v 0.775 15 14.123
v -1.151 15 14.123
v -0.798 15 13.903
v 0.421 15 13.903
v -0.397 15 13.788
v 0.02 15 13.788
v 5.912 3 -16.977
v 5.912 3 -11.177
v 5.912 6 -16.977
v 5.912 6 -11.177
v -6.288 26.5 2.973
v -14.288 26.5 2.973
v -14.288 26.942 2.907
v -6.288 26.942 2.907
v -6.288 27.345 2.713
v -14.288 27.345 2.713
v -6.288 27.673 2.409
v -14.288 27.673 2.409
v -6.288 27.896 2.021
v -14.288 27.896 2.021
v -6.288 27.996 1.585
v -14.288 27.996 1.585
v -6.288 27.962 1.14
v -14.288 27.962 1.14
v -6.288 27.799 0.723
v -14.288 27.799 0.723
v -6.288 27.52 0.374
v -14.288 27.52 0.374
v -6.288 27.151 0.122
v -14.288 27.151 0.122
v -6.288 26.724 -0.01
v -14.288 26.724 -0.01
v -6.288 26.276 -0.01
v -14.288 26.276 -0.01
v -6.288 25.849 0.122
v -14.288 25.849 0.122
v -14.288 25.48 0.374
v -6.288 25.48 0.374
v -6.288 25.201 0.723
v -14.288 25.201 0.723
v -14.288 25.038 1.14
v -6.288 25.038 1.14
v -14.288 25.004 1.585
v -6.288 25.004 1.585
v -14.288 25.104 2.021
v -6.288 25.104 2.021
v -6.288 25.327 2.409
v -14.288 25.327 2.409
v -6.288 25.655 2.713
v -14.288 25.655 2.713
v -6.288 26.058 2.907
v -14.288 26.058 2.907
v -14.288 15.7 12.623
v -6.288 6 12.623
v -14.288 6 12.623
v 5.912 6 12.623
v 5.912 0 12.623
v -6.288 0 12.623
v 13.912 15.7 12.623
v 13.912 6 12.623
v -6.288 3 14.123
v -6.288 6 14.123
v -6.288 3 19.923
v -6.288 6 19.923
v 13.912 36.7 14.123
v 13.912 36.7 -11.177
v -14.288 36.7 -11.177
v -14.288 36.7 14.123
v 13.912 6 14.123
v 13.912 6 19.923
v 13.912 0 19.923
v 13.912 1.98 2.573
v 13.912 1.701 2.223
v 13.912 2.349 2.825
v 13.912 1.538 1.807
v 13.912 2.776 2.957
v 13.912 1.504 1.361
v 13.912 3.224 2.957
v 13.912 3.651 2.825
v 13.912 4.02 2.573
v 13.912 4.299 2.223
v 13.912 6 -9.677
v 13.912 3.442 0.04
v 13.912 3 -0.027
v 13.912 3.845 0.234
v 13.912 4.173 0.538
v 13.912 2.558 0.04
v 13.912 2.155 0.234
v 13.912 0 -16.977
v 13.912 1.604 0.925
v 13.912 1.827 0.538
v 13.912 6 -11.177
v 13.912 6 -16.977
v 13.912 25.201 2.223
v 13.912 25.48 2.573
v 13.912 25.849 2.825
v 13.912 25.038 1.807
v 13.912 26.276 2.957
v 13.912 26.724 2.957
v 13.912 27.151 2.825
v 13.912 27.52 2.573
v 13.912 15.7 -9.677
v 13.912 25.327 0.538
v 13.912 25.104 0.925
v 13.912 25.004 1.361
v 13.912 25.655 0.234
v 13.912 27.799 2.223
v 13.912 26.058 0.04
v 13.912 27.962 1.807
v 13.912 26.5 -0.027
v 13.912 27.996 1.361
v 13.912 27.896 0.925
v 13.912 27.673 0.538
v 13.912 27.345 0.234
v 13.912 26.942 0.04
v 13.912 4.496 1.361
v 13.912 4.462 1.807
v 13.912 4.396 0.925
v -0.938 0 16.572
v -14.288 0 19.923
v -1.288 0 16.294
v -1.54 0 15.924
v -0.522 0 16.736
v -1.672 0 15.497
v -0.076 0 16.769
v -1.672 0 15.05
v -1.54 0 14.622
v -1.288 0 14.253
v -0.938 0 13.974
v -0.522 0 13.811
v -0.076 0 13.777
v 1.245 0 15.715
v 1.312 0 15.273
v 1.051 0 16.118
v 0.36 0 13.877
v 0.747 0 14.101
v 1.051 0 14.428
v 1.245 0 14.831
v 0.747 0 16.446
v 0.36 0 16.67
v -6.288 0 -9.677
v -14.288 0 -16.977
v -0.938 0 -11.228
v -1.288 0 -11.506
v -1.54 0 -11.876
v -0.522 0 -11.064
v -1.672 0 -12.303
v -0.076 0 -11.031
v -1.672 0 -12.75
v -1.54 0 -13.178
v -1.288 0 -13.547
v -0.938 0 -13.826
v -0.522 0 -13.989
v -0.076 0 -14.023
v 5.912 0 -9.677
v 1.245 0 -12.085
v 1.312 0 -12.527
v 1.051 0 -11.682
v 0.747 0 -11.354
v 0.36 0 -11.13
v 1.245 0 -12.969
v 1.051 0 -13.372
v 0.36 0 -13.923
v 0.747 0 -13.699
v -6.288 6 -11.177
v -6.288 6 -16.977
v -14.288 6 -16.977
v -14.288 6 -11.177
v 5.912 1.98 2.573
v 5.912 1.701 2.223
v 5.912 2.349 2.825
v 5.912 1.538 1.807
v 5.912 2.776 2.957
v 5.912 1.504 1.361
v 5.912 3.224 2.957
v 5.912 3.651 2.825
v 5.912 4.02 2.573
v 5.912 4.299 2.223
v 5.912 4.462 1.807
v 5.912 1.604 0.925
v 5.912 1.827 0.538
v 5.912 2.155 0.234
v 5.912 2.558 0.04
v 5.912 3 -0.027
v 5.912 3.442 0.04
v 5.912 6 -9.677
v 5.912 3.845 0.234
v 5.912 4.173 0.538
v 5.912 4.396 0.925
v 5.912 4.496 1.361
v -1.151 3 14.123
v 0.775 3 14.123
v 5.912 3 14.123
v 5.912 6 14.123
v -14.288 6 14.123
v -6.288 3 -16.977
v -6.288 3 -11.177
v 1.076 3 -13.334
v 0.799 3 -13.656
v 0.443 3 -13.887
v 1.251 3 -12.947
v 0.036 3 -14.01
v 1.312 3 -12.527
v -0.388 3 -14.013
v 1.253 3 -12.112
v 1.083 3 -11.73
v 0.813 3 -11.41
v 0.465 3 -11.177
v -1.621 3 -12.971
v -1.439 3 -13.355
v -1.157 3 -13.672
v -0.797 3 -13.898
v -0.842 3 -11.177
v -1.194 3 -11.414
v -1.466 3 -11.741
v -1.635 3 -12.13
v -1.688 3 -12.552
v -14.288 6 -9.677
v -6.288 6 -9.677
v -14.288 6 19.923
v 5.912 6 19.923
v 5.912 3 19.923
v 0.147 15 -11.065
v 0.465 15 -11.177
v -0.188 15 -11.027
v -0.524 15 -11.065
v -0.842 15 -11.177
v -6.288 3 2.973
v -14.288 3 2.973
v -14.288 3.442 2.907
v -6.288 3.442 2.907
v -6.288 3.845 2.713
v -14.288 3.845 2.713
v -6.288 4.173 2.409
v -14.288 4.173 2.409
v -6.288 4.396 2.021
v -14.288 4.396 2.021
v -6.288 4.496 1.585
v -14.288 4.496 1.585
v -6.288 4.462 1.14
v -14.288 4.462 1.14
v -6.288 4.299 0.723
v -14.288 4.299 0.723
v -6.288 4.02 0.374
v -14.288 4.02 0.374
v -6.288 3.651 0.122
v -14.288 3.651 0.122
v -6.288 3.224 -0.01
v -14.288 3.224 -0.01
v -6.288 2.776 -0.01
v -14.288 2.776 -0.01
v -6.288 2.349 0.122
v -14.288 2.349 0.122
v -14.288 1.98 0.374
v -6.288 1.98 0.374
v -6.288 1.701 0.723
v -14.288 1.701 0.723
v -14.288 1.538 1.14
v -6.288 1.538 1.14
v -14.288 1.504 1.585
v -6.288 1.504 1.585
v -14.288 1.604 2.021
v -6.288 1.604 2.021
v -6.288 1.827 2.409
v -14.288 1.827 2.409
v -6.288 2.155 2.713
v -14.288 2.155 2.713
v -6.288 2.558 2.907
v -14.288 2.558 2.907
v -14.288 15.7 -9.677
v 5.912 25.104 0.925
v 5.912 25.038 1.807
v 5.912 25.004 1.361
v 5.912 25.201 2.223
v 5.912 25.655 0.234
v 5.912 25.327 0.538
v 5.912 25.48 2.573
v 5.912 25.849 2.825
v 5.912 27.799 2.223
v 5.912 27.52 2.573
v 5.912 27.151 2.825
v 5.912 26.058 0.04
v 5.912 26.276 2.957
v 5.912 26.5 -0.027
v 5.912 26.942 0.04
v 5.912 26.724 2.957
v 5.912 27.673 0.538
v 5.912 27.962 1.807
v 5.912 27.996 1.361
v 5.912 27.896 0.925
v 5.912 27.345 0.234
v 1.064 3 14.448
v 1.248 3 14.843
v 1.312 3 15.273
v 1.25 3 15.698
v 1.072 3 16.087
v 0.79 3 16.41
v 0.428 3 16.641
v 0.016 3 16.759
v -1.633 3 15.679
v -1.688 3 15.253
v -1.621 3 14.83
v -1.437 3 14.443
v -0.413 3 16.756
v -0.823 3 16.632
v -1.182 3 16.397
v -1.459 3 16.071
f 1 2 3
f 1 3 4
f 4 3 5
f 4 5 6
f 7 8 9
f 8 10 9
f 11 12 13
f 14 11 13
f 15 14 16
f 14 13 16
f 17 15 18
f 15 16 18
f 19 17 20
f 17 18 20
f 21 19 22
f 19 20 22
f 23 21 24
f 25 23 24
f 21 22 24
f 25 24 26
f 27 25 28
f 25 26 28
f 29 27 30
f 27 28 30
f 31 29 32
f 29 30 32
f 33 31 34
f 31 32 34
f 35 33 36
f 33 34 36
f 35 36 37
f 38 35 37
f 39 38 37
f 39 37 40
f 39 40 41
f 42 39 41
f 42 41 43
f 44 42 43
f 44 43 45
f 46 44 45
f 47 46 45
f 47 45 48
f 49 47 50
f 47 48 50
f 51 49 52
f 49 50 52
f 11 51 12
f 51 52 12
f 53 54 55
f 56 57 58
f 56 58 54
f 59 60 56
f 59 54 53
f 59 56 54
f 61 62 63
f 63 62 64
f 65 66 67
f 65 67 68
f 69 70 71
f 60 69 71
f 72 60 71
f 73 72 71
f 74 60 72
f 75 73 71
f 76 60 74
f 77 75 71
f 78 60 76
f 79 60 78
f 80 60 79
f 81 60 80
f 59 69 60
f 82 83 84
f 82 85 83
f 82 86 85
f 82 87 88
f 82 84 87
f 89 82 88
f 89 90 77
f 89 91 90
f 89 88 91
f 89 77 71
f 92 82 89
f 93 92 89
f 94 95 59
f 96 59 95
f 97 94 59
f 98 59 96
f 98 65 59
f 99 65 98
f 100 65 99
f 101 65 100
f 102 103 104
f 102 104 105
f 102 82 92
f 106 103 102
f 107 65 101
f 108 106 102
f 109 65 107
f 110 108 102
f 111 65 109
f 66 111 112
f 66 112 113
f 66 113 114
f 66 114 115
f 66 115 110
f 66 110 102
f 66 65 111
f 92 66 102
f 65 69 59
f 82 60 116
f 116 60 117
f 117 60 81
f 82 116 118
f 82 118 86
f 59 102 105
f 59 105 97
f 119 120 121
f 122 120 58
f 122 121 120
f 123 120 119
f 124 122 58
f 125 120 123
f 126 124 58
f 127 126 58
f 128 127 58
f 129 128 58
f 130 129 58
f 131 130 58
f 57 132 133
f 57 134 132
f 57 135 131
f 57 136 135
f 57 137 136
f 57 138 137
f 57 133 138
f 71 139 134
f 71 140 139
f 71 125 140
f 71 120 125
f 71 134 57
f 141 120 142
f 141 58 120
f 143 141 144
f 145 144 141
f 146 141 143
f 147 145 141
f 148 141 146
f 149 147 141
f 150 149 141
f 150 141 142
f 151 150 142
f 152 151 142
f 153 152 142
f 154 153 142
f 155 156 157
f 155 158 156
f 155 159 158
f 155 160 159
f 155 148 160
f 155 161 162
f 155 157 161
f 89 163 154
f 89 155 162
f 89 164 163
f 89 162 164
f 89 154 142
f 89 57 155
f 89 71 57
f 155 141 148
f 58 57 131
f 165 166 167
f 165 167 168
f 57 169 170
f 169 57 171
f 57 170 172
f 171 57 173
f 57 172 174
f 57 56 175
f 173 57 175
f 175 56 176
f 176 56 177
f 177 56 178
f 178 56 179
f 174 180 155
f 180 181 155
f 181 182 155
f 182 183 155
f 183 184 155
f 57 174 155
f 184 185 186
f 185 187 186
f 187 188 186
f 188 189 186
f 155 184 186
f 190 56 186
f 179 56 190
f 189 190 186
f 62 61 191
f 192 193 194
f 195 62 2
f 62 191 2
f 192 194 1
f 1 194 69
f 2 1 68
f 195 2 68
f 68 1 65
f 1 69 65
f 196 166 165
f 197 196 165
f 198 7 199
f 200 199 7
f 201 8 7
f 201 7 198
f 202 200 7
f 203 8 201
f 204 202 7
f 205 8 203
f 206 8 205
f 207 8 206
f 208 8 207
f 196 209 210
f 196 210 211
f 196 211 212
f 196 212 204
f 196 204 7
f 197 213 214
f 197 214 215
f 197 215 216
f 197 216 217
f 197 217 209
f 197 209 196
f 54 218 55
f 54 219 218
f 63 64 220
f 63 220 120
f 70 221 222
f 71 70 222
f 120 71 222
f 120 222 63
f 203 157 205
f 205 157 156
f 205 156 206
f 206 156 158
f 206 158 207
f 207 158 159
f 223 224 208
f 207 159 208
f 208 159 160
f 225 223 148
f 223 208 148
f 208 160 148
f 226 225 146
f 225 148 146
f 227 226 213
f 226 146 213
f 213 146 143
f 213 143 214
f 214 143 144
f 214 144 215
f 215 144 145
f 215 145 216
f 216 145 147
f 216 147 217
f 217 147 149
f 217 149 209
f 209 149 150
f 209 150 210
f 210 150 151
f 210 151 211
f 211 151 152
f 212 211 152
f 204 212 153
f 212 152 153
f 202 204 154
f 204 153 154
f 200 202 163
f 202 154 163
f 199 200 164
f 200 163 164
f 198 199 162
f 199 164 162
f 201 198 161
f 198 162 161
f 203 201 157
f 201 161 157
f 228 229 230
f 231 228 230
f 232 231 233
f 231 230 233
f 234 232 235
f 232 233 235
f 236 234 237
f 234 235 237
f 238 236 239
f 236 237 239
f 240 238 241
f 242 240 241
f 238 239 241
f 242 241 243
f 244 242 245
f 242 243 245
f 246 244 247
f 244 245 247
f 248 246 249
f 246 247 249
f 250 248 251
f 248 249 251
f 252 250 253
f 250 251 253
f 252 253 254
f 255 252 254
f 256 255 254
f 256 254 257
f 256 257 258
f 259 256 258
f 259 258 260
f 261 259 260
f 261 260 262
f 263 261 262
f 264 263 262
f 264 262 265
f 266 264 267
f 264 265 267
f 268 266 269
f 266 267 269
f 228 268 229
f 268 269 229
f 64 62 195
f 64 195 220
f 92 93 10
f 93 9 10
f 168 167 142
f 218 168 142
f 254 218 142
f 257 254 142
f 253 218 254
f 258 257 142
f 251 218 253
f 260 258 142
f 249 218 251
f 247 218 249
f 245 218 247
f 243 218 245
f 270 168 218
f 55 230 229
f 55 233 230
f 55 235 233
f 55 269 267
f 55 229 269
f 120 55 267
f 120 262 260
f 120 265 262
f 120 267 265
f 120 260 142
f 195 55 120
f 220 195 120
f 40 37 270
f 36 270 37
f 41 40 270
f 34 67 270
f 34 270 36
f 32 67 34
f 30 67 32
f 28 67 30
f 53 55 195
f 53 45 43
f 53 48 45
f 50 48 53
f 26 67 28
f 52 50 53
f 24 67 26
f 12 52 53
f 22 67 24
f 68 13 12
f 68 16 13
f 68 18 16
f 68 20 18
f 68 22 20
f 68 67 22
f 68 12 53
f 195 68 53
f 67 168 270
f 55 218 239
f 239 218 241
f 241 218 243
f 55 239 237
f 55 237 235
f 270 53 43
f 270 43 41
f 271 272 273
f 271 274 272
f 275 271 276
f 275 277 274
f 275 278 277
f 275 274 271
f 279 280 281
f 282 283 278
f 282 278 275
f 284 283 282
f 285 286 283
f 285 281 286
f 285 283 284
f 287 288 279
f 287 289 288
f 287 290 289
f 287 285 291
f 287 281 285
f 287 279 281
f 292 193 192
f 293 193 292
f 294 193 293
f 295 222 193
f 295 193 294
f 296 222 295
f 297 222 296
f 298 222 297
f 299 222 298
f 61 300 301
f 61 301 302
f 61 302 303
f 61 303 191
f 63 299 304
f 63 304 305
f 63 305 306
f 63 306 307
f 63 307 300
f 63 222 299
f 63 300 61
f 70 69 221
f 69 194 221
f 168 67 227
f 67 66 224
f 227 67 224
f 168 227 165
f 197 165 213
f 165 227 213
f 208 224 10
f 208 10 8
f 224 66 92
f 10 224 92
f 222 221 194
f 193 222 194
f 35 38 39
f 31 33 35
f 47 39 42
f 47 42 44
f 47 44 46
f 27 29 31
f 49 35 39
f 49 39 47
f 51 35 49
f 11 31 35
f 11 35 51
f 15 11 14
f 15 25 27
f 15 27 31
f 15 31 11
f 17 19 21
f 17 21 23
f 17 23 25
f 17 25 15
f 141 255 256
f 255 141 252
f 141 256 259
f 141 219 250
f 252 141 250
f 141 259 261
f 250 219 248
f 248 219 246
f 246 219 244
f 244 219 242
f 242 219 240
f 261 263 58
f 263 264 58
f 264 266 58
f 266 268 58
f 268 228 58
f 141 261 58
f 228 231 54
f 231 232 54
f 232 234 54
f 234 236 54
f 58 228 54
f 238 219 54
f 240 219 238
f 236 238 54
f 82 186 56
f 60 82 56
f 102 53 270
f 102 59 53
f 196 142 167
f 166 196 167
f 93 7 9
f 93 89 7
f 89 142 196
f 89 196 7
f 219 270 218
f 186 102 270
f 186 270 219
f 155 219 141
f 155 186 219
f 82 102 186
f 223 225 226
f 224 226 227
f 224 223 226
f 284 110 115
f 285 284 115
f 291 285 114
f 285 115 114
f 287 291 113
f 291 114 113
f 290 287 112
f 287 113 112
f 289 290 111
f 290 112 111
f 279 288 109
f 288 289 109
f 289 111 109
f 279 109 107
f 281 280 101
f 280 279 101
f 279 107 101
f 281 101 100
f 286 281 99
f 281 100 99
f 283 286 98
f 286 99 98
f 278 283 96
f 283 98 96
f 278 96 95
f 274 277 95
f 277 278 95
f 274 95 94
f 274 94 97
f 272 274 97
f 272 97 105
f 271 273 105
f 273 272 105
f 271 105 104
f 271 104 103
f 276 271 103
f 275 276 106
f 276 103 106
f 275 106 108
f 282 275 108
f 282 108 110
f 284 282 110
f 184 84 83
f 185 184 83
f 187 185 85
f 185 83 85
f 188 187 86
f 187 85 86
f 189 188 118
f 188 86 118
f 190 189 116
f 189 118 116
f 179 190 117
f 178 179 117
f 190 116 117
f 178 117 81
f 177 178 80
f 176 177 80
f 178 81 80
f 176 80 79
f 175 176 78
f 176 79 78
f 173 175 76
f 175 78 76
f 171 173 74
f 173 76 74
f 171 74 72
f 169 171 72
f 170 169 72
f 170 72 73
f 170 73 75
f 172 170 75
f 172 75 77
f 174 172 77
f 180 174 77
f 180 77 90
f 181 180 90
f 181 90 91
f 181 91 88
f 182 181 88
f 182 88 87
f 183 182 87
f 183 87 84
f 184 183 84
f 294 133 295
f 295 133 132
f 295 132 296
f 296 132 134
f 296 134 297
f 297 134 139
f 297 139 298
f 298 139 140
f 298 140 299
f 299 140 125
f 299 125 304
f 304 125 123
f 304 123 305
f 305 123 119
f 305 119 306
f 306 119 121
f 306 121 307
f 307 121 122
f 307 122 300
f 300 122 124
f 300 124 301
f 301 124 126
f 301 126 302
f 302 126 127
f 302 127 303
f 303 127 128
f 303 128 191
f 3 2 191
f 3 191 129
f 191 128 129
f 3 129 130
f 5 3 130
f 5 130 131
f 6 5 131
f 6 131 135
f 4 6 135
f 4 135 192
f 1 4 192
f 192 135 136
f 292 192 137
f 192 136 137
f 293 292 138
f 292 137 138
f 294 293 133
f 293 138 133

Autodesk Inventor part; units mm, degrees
ref_plane "YZ Plane" through (0, 0, 0) normal (1, 0, 0) x (0, 1, 0)
ref_plane "XZ Plane" through (0, 0, 0) normal (0, 1, 0) x (-1, 0, 0)
ref_plane "XY Plane" through (0, 0, 0) normal (0, 0, 1) x (1, 0, 0)
sketch "Sketch1" plane through (0, 0, 0) normal (0, 1, 0) x (-1, 0, 0)
  line L0 (6.2884, 19.9233) -> (-5.9116, 19.9233)
  line L1 (-5.9116, 19.9233) -> (-5.9116, 12.6233)
  line L2 (-5.9116, 12.6233) -> (6.2884, 12.6233)
  line L3 (6.2884, 12.6233) -> (6.2884, 19.9233)
  point P0 (0, 0)
  dimension "d0" = 7.3
  dimension "d1" = 12.2
extrude "Extrusion1" add sketch "Sketch1" along normal blind 3
sketch "Sketch2" plane through (0, 3, 0) normal (0, 1, 0) x (1, 0, 0)
  line L0 (5.9116, -19.9233) -> (5.9116, -12.6233) projected
  line L1 (5.9116, -12.6233) -> (-6.2884, -12.6233) projected
  line L2 (-6.2884, -12.6233) -> (-6.2884, -19.9233) projected
  line L3 (-6.2884, -19.9233) -> (5.9116, -19.9233) projected
  line L4 (5.9116, -12.6233) -> (-6.2884, -12.6233)
  line L5 (-6.2884, -12.6233) -> (-6.2884, -14.1233)
  line L6 (-6.2884, -14.1233) -> (5.9116, -14.1233)
  line L7 (5.9116, -14.1233) -> (5.9116, -12.6233)
  point P0 (0, 0)
  point P1 (5.9116, -14.1233)
  dimension "d4" = 1.5
extrude "Extrusion2" add sketch "Sketch2" along normal blind 15.7 contours L6 L2 L1 L0
sketch "Sketch3" plane through (5.9116, 0, 12.6233) normal (0, 0, -1) x (-1, 0, 0)
  line L0 (0, 0) -> (12.2, 0) projected
  line L1 (12.2, 0) -> (12.2, 18.7) projected
  line L2 (0, 18.7) -> (12.2, 18.7) projected
  line L3 (0, 0) -> (0, 18.7) projected
  line L4 (0, 18.7) -> (12.2, 18.7)
  line L5 (12.2, 18.7) -> (12.2, 15.7)
  line L6 (12.2, 15.7) -> (0, 15.7)
  line L7 (0, 15.7) -> (0, 18.7)
  point P0 (5.9116, 0)
  point P1 (0, 15.7)
  dimension "d7" = 3
extrude "Extrusion3" add sketch "Sketch3" along normal blind 23.8 contours L3 L2 L1 L6
sketch "Sketch4" plane through (-6.2884, 15.7, 12.6233) normal (0, -1, 0) x (1, 0, 0)
  line L0 (0, 0) -> (12.2, 0) projected
  line L1 (0, 0) -> (0, -23.8) projected
  line L2 (12.2, -23.8) -> (0, -23.8) projected
  line L3 (12.2, 0) -> (12.2, -23.8) projected
  line L4 (12.2, -23.8) -> (0, -23.8)
  line L5 (0, -23.8) -> (0, -22.3)
  line L6 (0, -22.3) -> (12.2, -22.3)
  line L7 (12.2, -22.3) -> (12.2, -23.8)
  point P0 (6.2884, -12.6233)
  dimension "d10" = 1.5
extrude "Extrusion4" add sketch "Sketch4" along normal up to surface (15.7 mm away) contours L6 L3 L2 L1
sketch "Sketch5" plane through (5.9116, 0, -11.1767) normal (0, 0, -1) x (-1, 0, 0)
  line L0 (12.2, 18.7) -> (12.2, 0) projected
  line L1 (12.2, 18.7) -> (0, 18.7) projected
  line L2 (0, 18.7) -> (0, 0) projected
  line L3 (12.2, 0) -> (0, 0) projected
  line L4 (12.2, 0) -> (0, 0)
  line L5 (0, 0) -> (0, 3)
  line L6 (0, 3) -> (12.2, 3)
  line L7 (12.2, 3) -> (12.2, 0)
  point P0 (5.9116, 0)
  dimension "d13" = 3
extrude "Extrusion5" add sketch "Sketch5" along normal blind 5.8 contours L0 L3 L2 L6
sketch "Sketch6" plane through (0, 0, 0) normal (0, -1, 0) x (1, 0, 0)
  arc A0 (-0.7384, -2.4741) -> (0.3616, -2.4741) centre (-0.1884, -3.4267) ccw construction
  circle A1 centre (-0.1884, -3.4267) radius 1.1 construction
  arc A2 (0.3616, -32.1794) -> (-0.7384, -32.1794) centre (-0.1884, -31.2267) ccw projected
  circle A3 centre (-0.1884, -31.2267) radius 1.5
  circle A4 centre (-0.1884, -3.4267) radius 1.5
  point P0 (0, 0)
  dimension "d16" = 3
  dimension "d17" = 3
extrude "Extrusion6" cut sketch "Sketch6" against normal up to surface (3 mm away)
sketch "Sketch8" plane through (5.9116, 0, 19.9233) normal (1, 0, 0) x (0, 0, -1)
  line L0 (0, 0) -> (7.3, 0) projected
  line L1 (7.3, 0) -> (7.3, 15.7) projected
  line L2 (7.3, 15.7) -> (29.6, 15.7) projected
  line L3 (29.6, 15.7) -> (29.6, 0) projected
  line L4 (36.9, 0) -> (29.6, 0) projected
  line L5 (36.9, 3) -> (36.9, 0) projected
  line L6 (31.1, 3) -> (36.9, 3) projected
  line L7 (31.1, 18.7) -> (31.1, 3) projected
  line L8 (5.8, 18.7) -> (31.1, 18.7) projected
  line L9 (5.8, 3) -> (5.8, 18.7) projected
  line L10 (0, 3) -> (5.8, 3) projected
  line L11 (0, 0) -> (0, 3) projected
  line L12 (0, 0) -> (36.9, 0)
  line L13 (36.9, 0) -> (36.9, 6)
  line L14 (36.9, 6) -> (0, 6)
  line L15 (0, 6) -> (0, 0)
  point P0 (19.9233, 0)
  dimension "d22" = 6
extrude "Extrusion8" add sketch "Sketch8" along normal blind 8 contours L11 L10 L9 L14 L1 L0 | L1 L14 L3 L12 | L15 L14 L9 L10 | L3 L14 L7 L6 L5 L4 | L14 L13 L6 L7
sketch "Sketch9" plane through (-6.2884, 0, 12.6233) normal (-1, 0, 0) x (0, 0, 1)
  line L0 (-29.6, 6) -> (7.3, 6)
  line L1 (7.3, 6) -> (7.3, 0)
  line L2 (7.3, 0) -> (-29.6, 0)
  line L3 (-29.6, 0) -> (-29.6, 6)
  point P0 (-12.6233, 0)
  point P1 (7.3, 6)
  point P2 (-29.6, 0)
extrude "Extrusion9" add sketch "Sketch9" along normal blind 8
sketch "Sketch10" plane through (13.9116, 0, 19.9233) normal (1, 0, 0) x (0, 0, -1)
  line L0 (0, 6) -> (0, 0) projected
  line L1 (0, 0) -> (36.9, 0) projected
  line L2 (36.9, 0) -> (36.9, 6) projected
  line L3 (36.9, 6) -> (0, 6) projected
  line L4 (0, 6) -> (36.9, 0) construction
  line L5 (36.9, 6) -> (0, 0) construction
  circle A0 centre (18.45, 3) radius 1.5
  point P0 (19.9233, 0)
  dimension "d27" = 3
extrude "Extrusion10" cut sketch "Sketch10" against normal blind 8 contours A0
sketch "Sketch11" plane through (0, 18.7, 0) normal (0, 1, 0) x (1, 0, 0)
  line L0 (5.9116, -14.1233) -> (5.9116, 11.1767) projected
  line L1 (-6.2884, 11.1767) -> (5.9116, 11.1767) projected
  line L2 (-6.2884, -14.1233) -> (-6.2884, 11.1767) projected
  line L3 (-6.2884, -14.1233) -> (5.9116, -14.1233) projected
  line L4 (5.9116, -14.1233) -> (0, -14.1233)
  line L5 (0, -14.1233) -> (0, 11.1767)
  line L6 (0, 11.1767) -> (5.9116, 11.1767)
  line L7 (5.9116, 11.1767) -> (5.9116, -14.1233)
  point P0 (0, 0)
extrude "Extrusion11" add sketch "Sketch11" along normal blind 10 contours L3 L5 L1 L0
sketch "Sketch12" plane through (5.9116, 15.7, 12.6233) normal (1, 0, 0) x (0, 0, -1)
  line L0 (22.3, -9.7) -> (23.8, -9.7) projected
  line L1 (23.8, -9.7) -> (23.8, 13) projected
  line L2 (-1.5, 13) -> (23.8, 13) projected
  line L3 (-1.5, -9.7) -> (-1.5, 13) projected
  line L4 (-1.5, -9.7) -> (0, -9.7) projected
  line L5 (0, -9.7) -> (0, 0) projected
  line L6 (0, 0) -> (22.3, 0) projected
  line L7 (22.3, 0) -> (22.3, -9.7) projected
  line L8 (-1.5, 13) -> (23.8, 13)
  line L9 (23.8, 13) -> (23.8, 5)
  line L10 (23.8, 5) -> (-1.5, 5)
  line L11 (-1.5, 5) -> (-1.5, 13)
  point P0 (12.6233, -15.7)
  point P1 (-1.5, 5)
  dimension "d32" = 8
extrude "Extrusion12" add sketch "Sketch12" along normal up to surface (8 mm away) contours L10 L3 L2 L1
sketch "Sketch14" plane through (0, 28.7, 0) normal (0, 1, 0) x (1, 0, 0)
  line L0 (5.9116, 11.1767) -> (5.9116, -14.1233) projected
  line L1 (0, -14.1233) -> (13.9116, -14.1233) projected
  line L2 (13.9116, -14.1233) -> (13.9116, 11.1767) projected
  line L3 (0, 11.1767) -> (13.9116, 11.1767) projected
  line L4 (0, 11.1767) -> (0, -14.1233) projected
  line L5 (0, 11.1767) -> (13.9116, 11.1767)
  line L6 (13.9116, 11.1767) -> (13.9116, -14.1233)
  line L7 (13.9116, -14.1233) -> (0, -14.1233)
  line L8 (0, -14.1233) -> (0, 11.1767)
  point P0 (0, 0)
extrude "Extrusion14" add sketch "Sketch14" along normal blind 8
sketch "Sketch16" plane through (5.9116, 15.7, 12.6233) normal (1, 0, 0) x (0, 0, -1)
  line L0 (23.8, 5) -> (-1.5, 5) projected
  line L1 (-1.5, -9.7) -> (-1.5, 5) projected
  line L2 (-1.5, -9.7) -> (0, -9.7) projected
  line L3 (0, -9.7) -> (0, 0) projected
  line L4 (0, 0) -> (22.3, 0) projected
  line L5 (22.3, 0) -> (22.3, -9.7) projected
  line L6 (22.3, -9.7) -> (23.8, -9.7) projected
  line L7 (23.8, -9.7) -> (23.8, 5) projected
  point P0 (12.6233, -15.7)
extrude "Extrusion16" add sketch "Sketch16" along normal blind 8
sketch "Sketch17" plane through (13.9116, 0, 19.9233) normal (1, 0, 0) x (0, 0, -1)
  circle A0 centre (18.45, 3) radius 1.5 projected
  line L0 (18.45, 3) -> (18.45, 26.5)
  circle A1 centre (18.45, 26.5) radius 1.5
  point P0 (19.9233, 0)
  dimension "d46" = 23.5
  dimension "d47" = 3
extrude "Extrusion17" cut sketch "Sketch17" against normal blind 8 contours A1
sketch "Sketch18" plane through (0, 18.7, -11.1767) normal (-1, 0, 0) x (0, 0, 1)
  line L0 (25.3, 0) -> (0, 0) projected
  line L1 (25.3, 0) -> (25.3, 18) projected
  line L2 (0, 18) -> (25.3, 18) projected
  line L3 (0, 0) -> (0, 18) projected
  line L4 (0, -12.7) -> (1.5, -12.7) projected
  line L5 (1.5, -3) -> (1.5, -12.7) projected
  line L6 (23.8, -3) -> (1.5, -3) projected
  line L7 (23.8, -12.7) -> (23.8, -3) projected
  line L8 (23.8, -12.7) -> (25.3, -12.7) projected
  line L9 (25.3, -12.7) -> (25.3, 0) projected
  line L10 (25.3, 0) -> (0, 0) projected
  line L11 (0, 0) -> (0, -12.7) projected
  point P0 (11.1767, -18.7)
extrude "Extrusion18" add sketch "Sketch18" along normal up to surface (14.2884 mm away) contours L0 L3 L2 L1
sketch "Sketch19" plane through (-6.2884, 15.7, -9.6767) normal (-1, 0, 0) x (0, 0, 1)
  line L0 (-1.5, -9.7) -> (0, -9.7) projected
  line L1 (0, 0) -> (0, -9.7) projected
  line L2 (22.3, 0) -> (0, 0) projected
  line L3 (22.3, -9.7) -> (22.3, 0) projected
  line L4 (22.3, -9.7) -> (23.8, -9.7) projected
  line L5 (23.8, -9.7) -> (23.8, 3) projected
  line L6 (23.8, 3) -> (-1.5, 3) projected
  line L7 (-1.5, 3) -> (-1.5, -9.7) projected
  point P0 (9.6767, -15.7)
extrude "Extrusion19" add sketch "Sketch19" along normal up to surface (8 mm away)
sketch "Sketch20" plane through (-14.2884, 0, 12.6233) normal (-1, 0, 0) x (0, 0, 1)
  line L0 (-23.8, 6) -> (-29.6, 6) projected
  line L1 (-29.6, 6) -> (-29.6, 0) projected
  line L2 (-29.6, 0) -> (7.3, 0) projected
  line L3 (7.3, 0) -> (7.3, 6) projected
  line L4 (7.3, 6) -> (1.5, 6) projected
  line L5 (1.5, 36.7) -> (1.5, 6) projected
  line L6 (-23.8, 36.7) -> (1.5, 36.7) projected
  line L7 (-23.8, 6) -> (-23.8, 36.7) projected
  line L8 (-22.3, 15.7) -> (-22.3, 6) projected
  line L9 (0, 15.7) -> (-22.3, 15.7) projected
  line L10 (0, 6) -> (0, 15.7) projected
  line L11 (0, 6) -> (-22.3, 6) projected
  line L12 (-29.6, 6) -> (7.3, 0) construction
  line L13 (7.3, 6) -> (-29.6, 0) construction
  circle A0 centre (-11.15, 3) radius 1.5
  point P0 (-12.6233, 0)
  dimension "d54" = 3
extrude "Extrusion20" cut sketch "Sketch20" against normal blind 8 contours A0
sketch "Sketch21" plane through (-14.2884, 0, 12.6233) normal (-1, 0, 0) x (0, 0, 1)
  circle A0 centre (-11.15, 26.5) radius 1.5 projected
  point P0 (-12.6233, 0)
extrude "Extrusion21" cut sketch "Sketch21" against normal blind 8
sketch "Sketch22" plane through (0, 0, 0) normal (0, -1, 0) x (1, 0, 0)
  arc A0 (0.3616, -13.4794) -> (-0.7384, -13.4794) centre (-0.1884, -12.5267) ccw
  arc A1 (-0.7384, 16.2259) -> (0.3616, 16.2259) centre (-0.1884, 15.2733) ccw
  circle A2 centre (-0.1884, 15.2733) radius 1.5
  circle A3 centre (-0.1884, -12.5267) radius 1.5
  point P0 (0, 0)
  dimension "d59" = 3
  dimension "d60" = 3
extrude "Extrusion22" cut sketch "Sketch22" against normal blind 15
properties part number "support servo"
